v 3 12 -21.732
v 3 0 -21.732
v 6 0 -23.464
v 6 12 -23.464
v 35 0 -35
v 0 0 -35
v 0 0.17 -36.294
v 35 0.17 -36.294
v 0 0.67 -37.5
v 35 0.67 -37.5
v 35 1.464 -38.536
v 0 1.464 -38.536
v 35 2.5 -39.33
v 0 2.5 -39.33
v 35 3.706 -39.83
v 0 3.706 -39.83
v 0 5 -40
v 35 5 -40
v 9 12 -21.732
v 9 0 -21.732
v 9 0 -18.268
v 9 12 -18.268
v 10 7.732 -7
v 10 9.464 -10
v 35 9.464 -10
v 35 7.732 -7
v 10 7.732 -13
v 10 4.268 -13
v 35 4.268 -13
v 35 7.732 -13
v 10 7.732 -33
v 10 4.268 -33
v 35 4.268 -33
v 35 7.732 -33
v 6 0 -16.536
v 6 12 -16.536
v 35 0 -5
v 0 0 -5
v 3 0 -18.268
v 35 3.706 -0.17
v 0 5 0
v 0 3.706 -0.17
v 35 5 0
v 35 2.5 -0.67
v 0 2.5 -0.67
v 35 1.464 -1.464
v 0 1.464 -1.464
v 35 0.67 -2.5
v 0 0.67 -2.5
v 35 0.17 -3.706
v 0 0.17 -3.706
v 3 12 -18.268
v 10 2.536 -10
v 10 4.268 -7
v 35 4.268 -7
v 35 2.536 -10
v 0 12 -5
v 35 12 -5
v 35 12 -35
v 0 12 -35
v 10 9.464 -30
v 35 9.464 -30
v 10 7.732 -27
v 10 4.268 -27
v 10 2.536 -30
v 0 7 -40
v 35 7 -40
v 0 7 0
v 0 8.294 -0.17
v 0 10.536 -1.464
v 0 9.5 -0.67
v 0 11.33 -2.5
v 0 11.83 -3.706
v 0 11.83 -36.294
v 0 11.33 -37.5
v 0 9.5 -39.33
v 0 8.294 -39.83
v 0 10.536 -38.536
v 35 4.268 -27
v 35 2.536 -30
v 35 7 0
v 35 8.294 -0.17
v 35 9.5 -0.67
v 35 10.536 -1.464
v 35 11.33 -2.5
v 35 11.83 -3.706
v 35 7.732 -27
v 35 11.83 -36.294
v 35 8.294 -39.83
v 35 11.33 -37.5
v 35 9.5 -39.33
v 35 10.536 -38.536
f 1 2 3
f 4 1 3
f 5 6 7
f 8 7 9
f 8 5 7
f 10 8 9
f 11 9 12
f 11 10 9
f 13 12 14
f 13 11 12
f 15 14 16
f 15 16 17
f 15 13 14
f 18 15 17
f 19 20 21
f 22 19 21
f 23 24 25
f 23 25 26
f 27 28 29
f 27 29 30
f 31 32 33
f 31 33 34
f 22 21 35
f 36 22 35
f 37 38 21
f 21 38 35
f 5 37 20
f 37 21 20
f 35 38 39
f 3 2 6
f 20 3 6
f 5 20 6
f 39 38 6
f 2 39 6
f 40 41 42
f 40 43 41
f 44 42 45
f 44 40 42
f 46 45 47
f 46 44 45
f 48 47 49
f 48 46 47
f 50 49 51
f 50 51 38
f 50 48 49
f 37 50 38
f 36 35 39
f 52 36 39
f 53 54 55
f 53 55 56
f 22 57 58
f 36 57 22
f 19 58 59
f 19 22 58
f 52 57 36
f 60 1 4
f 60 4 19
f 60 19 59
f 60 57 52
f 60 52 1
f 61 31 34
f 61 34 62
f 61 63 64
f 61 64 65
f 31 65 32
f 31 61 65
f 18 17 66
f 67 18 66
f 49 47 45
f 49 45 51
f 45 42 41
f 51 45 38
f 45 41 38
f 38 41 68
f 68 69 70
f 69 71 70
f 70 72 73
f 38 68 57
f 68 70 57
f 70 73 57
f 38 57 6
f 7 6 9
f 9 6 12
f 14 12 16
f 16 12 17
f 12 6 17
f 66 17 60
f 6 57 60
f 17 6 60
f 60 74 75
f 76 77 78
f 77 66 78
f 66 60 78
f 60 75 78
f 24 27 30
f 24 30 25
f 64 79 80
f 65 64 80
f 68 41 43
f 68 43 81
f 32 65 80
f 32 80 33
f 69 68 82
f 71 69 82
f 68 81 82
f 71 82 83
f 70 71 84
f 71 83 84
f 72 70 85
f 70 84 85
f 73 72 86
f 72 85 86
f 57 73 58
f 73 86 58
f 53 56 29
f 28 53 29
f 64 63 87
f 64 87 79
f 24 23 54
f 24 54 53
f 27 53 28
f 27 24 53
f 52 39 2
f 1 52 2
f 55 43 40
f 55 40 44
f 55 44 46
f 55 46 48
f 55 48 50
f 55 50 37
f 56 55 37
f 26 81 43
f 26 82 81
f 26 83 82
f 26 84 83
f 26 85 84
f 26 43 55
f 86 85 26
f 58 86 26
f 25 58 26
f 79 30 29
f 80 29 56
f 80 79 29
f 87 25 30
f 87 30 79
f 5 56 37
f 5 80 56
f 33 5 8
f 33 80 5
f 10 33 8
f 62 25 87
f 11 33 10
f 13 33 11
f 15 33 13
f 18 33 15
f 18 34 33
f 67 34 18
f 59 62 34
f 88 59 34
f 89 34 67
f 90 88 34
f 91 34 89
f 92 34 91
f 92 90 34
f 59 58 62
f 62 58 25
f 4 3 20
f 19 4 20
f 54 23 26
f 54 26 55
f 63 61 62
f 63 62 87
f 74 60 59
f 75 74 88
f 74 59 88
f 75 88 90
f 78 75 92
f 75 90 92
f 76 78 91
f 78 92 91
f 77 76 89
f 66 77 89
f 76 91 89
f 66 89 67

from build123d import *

# Parameters (mm, degrees)
SKETCH_2_W          = 40
SKETCH_2_H          = 12
EXTRUDE_1_DEPTH     = 35
FILLET_1_R          = 5
CUT_EXTRUDE_1_DEPTH = 20
EXTRUDE_2_DEPTH     = 10


with BuildPart() as part:
    # 草图2 → 凸台-拉伸1 (new body)
    with BuildSketch(Plane(origin=(0, 0, 0), x_dir=(0, 0, -1), z_dir=(1, 0, 0))):
        with Locations((20, 6)):
            Rectangle(SKETCH_2_W, SKETCH_2_H)
        Polygon((10, 9.464101615), (7, 7.732050808), (7, 4.267949192), (10, 2.535898385), (13, 4.267949192), (13, 7.732050808), align=None, mode=Mode.SUBTRACT)
        Polygon((30, 9.464101615), (27, 7.732050808), (27, 4.267949192), (30, 2.535898385), (33, 4.267949192), (33, 7.732050808), align=None, mode=Mode.SUBTRACT)
    extrude(amount=EXTRUDE_1_DEPTH)

    # 圆角1
    fillet_1_edges = [part.edges().sort_by_distance(p)[0] for p in [
        (17.5, 12, 0),
        (17.5, 12, -40),
        (17.5, 0, -40),
        (17.5, 0, 0),
    ]]
    fillet(fillet_1_edges, radius=FILLET_1_R)

    # 草图3 → 切除-拉伸1 (cut)
    with BuildSketch(Plane.XZ):
        Polygon((6, -16.535898385), (3, -18.267949192), (3, -21.732050808), (6, -23.464101615), (9, -21.732050808), (9, -18.267949192), align=None)
    extrude(amount=-CUT_EXTRUDE_1_DEPTH, mode=Mode.SUBTRACT)

    # 草图4 → 凸台-拉伸2 (add)
    with BuildSketch(Plane.ZY):
        Polygon((-30, 9.464101615), (-27, 7.732050808), (-27, 4.267949192), (-30, 2.535898385), (-33, 4.267949192), (-33, 7.732050808), align=None)
        Polygon((-7, 7.732050808), (-7, 4.267949192), (-10, 2.535898385), (-13, 4.267949192), (-13, 7.732050808), (-10, 9.464101615), align=None)
    extrude(amount=-EXTRUDE_2_DEPTH)


solid = part.part
